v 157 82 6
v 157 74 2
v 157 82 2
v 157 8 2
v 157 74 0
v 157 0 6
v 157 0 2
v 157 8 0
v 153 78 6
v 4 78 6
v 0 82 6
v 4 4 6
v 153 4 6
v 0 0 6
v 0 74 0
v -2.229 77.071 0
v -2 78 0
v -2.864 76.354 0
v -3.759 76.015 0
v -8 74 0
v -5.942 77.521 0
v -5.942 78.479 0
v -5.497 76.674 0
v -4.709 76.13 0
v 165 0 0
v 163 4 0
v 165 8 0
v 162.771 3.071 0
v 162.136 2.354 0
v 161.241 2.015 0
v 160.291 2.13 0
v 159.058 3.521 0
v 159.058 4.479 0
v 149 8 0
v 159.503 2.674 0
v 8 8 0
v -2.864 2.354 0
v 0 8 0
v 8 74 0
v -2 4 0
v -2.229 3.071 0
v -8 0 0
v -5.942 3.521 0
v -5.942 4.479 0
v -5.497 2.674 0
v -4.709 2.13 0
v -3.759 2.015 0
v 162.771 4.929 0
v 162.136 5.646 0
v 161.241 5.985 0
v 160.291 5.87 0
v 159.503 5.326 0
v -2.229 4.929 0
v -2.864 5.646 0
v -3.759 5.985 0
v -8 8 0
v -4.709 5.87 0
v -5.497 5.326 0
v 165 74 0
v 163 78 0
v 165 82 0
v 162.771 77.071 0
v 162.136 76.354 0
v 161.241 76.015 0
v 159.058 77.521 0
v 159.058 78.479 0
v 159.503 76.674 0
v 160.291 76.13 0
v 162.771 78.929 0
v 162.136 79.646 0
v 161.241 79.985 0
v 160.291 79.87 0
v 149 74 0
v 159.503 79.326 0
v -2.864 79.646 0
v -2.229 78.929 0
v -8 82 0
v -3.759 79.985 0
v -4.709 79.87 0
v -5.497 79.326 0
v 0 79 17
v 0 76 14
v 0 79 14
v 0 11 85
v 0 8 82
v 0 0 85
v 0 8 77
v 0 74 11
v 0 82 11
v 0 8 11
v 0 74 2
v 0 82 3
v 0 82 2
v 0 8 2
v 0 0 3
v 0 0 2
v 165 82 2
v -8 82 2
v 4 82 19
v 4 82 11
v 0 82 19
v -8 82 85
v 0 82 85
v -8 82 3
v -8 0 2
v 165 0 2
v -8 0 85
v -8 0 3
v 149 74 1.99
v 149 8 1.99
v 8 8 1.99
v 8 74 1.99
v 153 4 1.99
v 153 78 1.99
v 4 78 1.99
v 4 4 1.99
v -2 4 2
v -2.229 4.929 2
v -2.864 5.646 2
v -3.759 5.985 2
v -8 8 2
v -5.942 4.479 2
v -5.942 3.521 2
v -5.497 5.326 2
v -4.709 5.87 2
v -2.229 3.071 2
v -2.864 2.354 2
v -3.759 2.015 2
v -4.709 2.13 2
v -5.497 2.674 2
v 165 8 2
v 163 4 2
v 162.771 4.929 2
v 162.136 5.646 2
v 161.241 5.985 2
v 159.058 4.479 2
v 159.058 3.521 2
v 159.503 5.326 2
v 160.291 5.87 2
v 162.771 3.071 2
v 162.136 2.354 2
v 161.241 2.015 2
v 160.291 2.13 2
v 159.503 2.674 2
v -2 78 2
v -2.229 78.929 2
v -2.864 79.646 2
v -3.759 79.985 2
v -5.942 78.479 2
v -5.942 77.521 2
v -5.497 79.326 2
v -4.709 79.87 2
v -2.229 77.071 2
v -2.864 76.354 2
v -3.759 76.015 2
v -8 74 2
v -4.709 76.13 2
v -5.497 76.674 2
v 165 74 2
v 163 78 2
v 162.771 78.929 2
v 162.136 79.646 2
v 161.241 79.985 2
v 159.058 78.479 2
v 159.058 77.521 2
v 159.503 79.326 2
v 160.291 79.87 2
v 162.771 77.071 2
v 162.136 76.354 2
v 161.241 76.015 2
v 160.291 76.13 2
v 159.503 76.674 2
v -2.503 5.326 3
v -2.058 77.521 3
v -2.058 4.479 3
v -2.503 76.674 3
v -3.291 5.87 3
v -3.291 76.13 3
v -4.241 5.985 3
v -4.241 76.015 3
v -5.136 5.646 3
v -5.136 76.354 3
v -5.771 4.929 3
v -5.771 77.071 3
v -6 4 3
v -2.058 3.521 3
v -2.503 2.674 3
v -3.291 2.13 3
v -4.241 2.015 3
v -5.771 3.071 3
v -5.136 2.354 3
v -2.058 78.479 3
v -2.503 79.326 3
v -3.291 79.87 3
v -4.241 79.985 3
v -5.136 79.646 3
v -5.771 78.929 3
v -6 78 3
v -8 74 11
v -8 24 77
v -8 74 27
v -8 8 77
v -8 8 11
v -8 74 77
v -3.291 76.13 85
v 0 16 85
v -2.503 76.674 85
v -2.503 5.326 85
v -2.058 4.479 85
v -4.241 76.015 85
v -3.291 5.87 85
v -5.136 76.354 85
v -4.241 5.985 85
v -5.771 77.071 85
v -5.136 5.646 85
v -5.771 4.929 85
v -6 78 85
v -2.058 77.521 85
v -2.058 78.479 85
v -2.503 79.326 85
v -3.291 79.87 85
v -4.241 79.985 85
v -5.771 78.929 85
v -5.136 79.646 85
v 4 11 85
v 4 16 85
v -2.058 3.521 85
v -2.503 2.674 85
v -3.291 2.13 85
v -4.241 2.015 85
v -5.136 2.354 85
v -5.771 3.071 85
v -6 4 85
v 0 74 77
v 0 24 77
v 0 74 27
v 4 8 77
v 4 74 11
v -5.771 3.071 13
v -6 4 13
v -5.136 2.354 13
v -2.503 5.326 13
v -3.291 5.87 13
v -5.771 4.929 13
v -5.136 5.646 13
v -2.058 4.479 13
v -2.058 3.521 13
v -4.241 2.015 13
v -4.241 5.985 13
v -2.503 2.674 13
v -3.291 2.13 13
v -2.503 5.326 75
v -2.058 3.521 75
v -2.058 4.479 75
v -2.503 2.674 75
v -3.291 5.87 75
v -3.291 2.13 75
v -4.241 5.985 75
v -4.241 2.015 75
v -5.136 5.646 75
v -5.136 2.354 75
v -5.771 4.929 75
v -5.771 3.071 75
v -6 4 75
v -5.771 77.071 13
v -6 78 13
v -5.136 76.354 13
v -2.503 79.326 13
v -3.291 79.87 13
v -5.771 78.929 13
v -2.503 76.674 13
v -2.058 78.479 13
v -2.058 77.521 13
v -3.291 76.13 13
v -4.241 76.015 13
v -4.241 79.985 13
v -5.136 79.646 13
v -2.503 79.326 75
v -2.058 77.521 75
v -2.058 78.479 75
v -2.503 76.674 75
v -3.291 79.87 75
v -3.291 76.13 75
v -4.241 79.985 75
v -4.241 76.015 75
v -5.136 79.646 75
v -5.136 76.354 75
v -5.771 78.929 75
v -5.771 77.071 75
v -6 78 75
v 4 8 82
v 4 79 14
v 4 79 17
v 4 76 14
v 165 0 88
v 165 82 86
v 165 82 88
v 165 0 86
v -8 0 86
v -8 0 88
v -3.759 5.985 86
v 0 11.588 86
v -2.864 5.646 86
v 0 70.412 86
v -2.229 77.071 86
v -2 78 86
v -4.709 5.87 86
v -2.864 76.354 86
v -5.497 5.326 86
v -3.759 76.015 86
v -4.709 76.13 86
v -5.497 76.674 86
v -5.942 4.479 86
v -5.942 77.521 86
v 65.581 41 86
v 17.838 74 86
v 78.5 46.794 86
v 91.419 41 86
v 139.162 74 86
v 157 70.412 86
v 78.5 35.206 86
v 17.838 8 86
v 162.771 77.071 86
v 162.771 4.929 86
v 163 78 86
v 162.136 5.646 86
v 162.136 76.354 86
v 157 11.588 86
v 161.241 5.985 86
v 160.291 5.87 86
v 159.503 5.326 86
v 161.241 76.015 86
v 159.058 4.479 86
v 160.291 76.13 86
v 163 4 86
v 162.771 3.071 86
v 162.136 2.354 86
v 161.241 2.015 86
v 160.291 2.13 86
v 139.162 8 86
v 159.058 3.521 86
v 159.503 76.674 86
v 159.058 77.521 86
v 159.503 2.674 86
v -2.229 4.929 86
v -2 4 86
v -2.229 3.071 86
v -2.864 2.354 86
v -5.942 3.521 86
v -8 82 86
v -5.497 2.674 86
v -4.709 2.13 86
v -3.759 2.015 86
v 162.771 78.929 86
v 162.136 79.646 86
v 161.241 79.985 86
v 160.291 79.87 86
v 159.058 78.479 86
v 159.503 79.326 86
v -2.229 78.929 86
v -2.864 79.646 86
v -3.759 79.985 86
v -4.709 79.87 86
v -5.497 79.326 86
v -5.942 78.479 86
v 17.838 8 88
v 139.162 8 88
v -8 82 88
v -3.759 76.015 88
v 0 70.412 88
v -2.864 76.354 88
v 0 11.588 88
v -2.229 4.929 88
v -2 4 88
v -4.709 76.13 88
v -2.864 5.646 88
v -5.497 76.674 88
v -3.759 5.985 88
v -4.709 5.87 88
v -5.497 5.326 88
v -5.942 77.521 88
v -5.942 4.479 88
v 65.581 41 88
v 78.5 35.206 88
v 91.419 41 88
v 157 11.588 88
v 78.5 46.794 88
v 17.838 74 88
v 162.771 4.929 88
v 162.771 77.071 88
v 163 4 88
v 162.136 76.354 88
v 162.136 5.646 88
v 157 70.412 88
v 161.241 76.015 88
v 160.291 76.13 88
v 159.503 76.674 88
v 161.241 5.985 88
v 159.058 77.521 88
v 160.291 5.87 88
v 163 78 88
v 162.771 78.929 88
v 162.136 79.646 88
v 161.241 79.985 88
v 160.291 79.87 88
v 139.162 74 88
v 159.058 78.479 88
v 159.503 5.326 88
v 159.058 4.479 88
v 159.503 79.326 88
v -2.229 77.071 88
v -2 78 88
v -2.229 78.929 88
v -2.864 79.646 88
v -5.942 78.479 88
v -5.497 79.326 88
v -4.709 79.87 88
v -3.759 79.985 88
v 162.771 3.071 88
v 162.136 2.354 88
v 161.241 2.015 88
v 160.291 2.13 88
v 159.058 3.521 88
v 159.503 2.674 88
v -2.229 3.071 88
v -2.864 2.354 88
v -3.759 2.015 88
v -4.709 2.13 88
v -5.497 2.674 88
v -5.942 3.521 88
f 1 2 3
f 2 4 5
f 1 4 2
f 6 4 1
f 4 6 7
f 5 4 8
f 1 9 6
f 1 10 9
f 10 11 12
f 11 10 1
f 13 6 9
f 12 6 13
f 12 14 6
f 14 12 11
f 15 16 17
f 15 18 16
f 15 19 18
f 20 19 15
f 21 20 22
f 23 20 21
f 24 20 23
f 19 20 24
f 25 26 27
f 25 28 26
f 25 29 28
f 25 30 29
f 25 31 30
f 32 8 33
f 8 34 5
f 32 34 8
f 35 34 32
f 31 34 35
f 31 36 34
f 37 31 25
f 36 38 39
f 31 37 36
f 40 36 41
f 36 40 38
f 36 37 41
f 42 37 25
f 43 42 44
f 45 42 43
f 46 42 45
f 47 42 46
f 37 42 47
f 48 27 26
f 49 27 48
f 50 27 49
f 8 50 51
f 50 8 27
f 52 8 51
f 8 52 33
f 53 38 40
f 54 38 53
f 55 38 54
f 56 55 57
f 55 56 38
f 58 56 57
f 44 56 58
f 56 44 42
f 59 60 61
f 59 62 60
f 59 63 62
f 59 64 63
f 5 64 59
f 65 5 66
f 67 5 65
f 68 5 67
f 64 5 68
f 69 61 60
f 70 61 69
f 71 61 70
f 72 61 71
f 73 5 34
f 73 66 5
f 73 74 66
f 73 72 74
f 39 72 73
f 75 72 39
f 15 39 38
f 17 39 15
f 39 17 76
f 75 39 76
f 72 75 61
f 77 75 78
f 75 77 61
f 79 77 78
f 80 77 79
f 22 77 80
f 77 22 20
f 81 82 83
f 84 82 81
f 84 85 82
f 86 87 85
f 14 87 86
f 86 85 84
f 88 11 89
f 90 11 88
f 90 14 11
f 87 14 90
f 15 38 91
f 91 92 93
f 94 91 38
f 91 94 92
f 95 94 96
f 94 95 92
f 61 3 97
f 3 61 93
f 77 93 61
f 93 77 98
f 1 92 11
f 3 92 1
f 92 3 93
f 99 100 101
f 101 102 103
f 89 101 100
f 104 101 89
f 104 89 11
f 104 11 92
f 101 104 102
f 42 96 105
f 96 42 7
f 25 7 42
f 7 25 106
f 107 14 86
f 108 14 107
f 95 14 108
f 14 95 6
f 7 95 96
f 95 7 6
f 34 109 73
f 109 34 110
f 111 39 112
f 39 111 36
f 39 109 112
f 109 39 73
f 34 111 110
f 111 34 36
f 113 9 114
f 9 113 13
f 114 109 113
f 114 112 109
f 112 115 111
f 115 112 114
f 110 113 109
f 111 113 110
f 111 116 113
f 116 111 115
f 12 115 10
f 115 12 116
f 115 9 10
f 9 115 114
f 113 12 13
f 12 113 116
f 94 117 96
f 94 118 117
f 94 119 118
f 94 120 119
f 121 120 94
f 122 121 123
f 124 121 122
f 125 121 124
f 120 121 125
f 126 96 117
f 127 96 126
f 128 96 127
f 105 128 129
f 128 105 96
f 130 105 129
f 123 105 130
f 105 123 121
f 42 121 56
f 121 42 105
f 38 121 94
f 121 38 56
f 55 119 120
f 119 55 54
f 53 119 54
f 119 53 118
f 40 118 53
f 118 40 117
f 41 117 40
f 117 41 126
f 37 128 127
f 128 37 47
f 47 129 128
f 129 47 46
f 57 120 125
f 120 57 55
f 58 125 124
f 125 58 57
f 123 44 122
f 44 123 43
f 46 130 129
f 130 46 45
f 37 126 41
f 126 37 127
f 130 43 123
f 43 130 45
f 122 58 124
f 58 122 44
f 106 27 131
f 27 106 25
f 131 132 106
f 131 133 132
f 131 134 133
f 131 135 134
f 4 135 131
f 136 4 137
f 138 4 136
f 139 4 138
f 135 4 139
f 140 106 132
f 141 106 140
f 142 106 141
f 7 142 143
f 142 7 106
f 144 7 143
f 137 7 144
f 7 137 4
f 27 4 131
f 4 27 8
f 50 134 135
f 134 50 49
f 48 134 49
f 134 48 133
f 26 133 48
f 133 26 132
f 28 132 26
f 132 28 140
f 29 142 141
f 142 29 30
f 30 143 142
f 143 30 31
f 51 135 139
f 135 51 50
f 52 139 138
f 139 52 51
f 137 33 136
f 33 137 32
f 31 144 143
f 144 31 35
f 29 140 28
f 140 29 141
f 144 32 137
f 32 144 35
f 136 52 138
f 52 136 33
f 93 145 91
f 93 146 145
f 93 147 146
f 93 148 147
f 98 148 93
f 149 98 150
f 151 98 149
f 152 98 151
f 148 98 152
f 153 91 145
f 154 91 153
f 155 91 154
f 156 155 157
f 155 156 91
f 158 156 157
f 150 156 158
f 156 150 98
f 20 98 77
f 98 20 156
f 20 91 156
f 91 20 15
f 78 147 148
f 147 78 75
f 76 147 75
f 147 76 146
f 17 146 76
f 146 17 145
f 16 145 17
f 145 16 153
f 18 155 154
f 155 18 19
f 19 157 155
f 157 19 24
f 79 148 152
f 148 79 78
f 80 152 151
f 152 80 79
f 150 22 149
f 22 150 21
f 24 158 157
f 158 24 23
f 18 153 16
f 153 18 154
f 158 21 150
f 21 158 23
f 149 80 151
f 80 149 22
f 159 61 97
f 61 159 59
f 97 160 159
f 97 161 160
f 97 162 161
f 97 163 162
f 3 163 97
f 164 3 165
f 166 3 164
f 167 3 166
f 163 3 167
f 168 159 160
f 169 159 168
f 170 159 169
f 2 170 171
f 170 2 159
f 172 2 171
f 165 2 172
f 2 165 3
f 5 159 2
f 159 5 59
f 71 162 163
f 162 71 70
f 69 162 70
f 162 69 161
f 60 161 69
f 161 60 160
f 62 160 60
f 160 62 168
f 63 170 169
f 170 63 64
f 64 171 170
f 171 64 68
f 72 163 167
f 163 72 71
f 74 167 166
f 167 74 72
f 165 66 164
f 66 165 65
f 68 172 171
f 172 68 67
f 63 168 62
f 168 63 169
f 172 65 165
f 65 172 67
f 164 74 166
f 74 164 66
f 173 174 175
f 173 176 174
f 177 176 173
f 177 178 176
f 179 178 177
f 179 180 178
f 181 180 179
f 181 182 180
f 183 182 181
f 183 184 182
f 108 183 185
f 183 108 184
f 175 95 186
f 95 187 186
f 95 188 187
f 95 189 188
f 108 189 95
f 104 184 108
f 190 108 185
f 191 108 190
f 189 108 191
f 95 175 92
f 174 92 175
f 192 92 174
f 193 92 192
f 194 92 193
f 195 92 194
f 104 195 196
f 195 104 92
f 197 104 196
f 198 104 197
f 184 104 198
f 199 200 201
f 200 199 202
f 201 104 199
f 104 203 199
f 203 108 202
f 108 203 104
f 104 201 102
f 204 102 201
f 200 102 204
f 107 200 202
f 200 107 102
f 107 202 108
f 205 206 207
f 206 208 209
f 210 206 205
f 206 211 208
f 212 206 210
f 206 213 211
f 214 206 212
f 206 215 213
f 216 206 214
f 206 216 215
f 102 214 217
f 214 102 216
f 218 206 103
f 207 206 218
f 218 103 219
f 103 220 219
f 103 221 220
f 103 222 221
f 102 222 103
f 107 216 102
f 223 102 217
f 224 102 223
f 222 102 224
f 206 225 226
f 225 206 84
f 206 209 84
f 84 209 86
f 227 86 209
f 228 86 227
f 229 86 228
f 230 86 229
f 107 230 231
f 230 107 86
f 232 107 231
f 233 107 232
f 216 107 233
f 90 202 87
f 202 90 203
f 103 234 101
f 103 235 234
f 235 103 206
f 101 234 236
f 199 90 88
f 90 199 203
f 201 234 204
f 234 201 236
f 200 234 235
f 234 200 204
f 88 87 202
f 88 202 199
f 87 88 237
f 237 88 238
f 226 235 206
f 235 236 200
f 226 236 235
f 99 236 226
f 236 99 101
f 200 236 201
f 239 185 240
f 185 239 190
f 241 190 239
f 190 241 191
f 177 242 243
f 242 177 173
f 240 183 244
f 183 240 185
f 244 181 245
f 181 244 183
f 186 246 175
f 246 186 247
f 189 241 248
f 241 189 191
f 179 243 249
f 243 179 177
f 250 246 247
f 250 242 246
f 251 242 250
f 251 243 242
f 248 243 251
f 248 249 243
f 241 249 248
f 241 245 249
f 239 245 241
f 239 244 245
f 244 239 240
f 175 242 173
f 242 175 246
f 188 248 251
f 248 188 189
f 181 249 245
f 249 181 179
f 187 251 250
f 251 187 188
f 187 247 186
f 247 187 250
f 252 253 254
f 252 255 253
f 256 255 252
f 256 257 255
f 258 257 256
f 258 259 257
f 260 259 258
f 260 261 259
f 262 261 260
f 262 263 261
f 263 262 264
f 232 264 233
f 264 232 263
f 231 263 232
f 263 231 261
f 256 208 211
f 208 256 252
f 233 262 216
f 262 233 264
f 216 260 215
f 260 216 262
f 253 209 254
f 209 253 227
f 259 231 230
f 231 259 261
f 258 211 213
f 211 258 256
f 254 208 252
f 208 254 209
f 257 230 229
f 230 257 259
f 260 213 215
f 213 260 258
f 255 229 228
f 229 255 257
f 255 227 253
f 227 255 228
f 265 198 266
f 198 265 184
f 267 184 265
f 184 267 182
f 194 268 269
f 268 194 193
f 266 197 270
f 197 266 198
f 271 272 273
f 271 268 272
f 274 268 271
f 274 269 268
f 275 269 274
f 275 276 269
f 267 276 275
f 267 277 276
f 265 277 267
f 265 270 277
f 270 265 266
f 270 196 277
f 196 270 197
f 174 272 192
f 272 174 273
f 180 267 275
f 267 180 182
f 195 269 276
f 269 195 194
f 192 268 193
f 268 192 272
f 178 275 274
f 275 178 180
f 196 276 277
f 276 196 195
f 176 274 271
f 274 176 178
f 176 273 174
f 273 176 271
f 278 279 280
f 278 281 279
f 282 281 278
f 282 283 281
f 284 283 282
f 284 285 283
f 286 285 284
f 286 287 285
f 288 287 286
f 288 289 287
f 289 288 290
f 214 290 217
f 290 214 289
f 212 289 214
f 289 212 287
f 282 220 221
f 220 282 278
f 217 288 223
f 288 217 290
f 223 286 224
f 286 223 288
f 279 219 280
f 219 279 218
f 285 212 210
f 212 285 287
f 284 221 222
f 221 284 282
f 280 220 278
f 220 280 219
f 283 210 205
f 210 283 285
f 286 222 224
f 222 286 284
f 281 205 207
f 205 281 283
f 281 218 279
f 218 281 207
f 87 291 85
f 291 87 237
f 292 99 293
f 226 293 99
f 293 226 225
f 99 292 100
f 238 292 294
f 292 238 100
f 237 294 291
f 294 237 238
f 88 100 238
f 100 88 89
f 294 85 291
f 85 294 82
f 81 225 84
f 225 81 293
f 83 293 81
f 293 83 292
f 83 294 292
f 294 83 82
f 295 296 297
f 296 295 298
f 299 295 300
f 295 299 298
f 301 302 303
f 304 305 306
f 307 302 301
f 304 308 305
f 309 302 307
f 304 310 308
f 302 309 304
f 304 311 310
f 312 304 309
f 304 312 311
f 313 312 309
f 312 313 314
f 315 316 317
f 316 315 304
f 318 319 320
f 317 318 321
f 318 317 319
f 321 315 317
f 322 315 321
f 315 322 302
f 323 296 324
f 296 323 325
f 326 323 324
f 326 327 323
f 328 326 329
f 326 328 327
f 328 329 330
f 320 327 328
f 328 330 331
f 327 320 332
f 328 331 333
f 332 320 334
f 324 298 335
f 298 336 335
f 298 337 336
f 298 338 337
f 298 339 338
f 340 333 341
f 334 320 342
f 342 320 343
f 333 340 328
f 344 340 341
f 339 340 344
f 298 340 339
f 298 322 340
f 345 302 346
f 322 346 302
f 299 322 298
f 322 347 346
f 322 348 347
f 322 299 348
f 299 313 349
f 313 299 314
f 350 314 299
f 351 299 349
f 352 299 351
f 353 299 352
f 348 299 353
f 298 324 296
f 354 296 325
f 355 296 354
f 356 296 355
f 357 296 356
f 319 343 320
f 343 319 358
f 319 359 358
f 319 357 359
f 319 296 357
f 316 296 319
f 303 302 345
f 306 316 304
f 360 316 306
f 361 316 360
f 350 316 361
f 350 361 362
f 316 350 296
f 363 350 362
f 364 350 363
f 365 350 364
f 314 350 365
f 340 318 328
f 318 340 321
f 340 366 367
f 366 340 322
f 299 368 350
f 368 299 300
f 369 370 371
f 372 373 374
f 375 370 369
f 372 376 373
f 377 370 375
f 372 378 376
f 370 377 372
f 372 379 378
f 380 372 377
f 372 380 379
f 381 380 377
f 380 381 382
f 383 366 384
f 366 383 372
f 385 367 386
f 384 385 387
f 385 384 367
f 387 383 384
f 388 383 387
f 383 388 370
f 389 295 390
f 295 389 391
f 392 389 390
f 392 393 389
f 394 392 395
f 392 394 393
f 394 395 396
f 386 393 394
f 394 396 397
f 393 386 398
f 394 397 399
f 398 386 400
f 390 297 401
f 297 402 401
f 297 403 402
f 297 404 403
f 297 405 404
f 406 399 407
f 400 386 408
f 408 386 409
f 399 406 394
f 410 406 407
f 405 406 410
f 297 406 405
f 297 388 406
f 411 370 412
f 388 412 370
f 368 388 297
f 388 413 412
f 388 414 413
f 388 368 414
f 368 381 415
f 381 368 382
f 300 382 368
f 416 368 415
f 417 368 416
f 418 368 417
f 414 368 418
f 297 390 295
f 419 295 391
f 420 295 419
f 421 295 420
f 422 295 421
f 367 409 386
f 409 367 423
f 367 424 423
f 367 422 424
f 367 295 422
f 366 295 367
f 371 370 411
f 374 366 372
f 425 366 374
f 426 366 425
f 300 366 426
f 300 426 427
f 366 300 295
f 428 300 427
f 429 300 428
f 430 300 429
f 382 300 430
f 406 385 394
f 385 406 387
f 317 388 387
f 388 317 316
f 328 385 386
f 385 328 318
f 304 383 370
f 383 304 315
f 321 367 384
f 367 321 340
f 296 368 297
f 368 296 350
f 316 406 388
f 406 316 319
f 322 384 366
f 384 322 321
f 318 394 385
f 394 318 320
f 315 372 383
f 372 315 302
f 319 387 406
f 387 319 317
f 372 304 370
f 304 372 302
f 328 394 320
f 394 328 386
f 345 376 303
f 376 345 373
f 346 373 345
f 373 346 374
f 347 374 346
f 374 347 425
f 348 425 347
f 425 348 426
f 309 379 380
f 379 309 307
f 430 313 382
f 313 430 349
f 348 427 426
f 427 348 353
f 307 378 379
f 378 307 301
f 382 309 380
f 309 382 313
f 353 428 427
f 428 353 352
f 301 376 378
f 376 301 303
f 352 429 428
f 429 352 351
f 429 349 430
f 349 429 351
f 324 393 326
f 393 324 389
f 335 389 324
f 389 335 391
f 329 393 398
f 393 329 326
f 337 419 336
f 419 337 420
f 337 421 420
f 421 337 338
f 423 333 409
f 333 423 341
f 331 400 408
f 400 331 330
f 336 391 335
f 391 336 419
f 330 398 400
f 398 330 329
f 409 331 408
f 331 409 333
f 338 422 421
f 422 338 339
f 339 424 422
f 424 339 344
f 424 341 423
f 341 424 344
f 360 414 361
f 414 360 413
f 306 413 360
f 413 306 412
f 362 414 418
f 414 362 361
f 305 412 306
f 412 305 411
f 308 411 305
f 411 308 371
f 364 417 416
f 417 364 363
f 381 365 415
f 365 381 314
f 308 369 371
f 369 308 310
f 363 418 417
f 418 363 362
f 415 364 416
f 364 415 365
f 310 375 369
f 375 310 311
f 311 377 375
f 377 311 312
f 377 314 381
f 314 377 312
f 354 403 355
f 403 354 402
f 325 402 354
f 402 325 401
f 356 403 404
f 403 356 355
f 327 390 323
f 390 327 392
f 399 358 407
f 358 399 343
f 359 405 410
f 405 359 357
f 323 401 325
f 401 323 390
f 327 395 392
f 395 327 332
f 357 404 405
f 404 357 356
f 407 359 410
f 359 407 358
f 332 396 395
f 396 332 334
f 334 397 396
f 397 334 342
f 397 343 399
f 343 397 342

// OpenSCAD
part="NOSTL_all";//[NOSTL_all,phone_frame,mirror_frame,mirror_frame_mirrored,top_bracket,filter_holder]
width=149;
height=74;
shelf=4;
depth=4;
wall_v=4;
wall_h=2;
hole=4;
glass=3;
bissl=1/100;
beam=2*wall_h+hole;
filter_size=[50,50];
filter_placement=[32,41];
fp=[filter_placement[0],filter_placement[1],wall_h/2];
$fs=1/1;
$fa=1/1;
screws=[[-beam/2,beam/2,wall_h/2],
          [width+2*wall_v+beam/2,beam/2,wall_h/2],
          [-beam/2,height+2*wall_v-beam/2,wall_h/2],
          [width+2*wall_v+beam/2,height+2*wall_v-beam/2,wall_h/2]];

module chain_hull() {
  for (i = [0:$children-2]) {
    hull() {
      children(i);
      children(i+1);
    }
  }
}

module pairwise_hull() {
  for (i=[0:$children-1]) for (j=[0:i]) hull() {
    children(i);
    children(j);
  }
}

module phone_frame() {
  difference() {
    cube([width+2*wall_v,height+2*wall_v,wall_h+depth]);
    translate([wall_v+shelf,wall_v+shelf,-bissl])cube([width-2*shelf,height-2*shelf,wall_h+2*bissl]);
    translate([wall_v,wall_v,wall_h-bissl])cube([width,height,depth+2*bissl]);
  }
  for(tr=screws) translate(tr) difference() {
    cube([beam,beam,wall_h],center=true);
    cylinder(d=hole,h=wall_h+bissl,center=true);
  }
}

module mirror_frame() {
  difference() {
    chain_hull() {
      translate([height+2*wall_v-beam,0,0]) cube(beam);
      translate([0,0,0]) cube(beam);
      translate([0,height+2*wall_v-beam,0]) cube(beam);
      translate([height+2*wall_v-beam,height+2*wall_v-beam,0]) cube(beam);
      translate([height+2*wall_v-beam,beam,0]) cube(beam);
      translate([beam,height+2*wall_v-beam,0]) cube(beam);
    }
    translate([0,beam/2,beam/2]) rotate([0,90,0]) cylinder(d=hole,h=20,center=true);
    translate([height+2*wall_v,beam/2,beam/2]) rotate([0,90,0]) cylinder(d=hole,h=20,center=true);
    translate([0,height+2*wall_v-beam/2,beam/2]) rotate([0,90,0]) cylinder(d=hole,h=20,center=true);
    translate([height+2*wall_v,height+2*wall_v-beam/2,beam/2]) rotate([0,90,0]) cylinder(d=hole,h=20,center=true);
  }
  difference() {
    hull() {
      translate([beam,beam+height+2*wall_v-2*beam,beam]) cube([beam,beam,wall_v]);
      translate([beam+height+2*wall_v-2*beam,beam,beam]) cube([beam,beam,wall_v]);
    }
    hull() {
      translate([beam+glass,beam+height+2*wall_v-2*glass-beam,beam]) cube([glass,glass,beam+bissl]);
      translate([beam+height+2*wall_v-glass,0,beam]) cube([glass,glass,beam+bissl]);
    }
  }
}

module top_bracket() {
  difference() {
    chain_hull() {
      translate(screws[0]) cube([beam,beam,wall_h],center=true);
      translate(screws[1]) cube([beam,beam,wall_h],center=true);
      translate(screws[2]) cube([beam,beam,wall_h],center=true);
      translate(screws[3]) cube([beam,beam,wall_h],center=true);
      translate(screws[0]) cube([beam,beam,wall_h],center=true);
      translate(screws[2]) cube([beam,beam,wall_h],center=true);
      translate(screws[1]) cube([beam,beam,wall_h],center=true);
      translate(screws[3]) cube([beam,beam,wall_h],center=true);
    }
    for (tr=screws) translate(tr) cylinder(d=hole,h=wall_h+bissl,center=true);
  }
}

module filter_holder() {
  difference() {
    union() {
      chain_hull() {
        translate(screws[0]) cube([beam,beam,2*wall_h],center=true);
        translate(fp) cube([beam,beam,2*wall_h],center=true);
        translate(screws[0]) cube([beam,beam,2*wall_h],center=true);
        translate(screws[1]) cube([beam,beam,2*wall_h],center=true);
        translate(fp) cube([beam,beam,2*wall_h],center=true);
        translate(screws[1]) cube([beam,beam,2*wall_h],center=true);
        translate(screws[3]) cube([beam,beam,2*wall_h],center=true);
        translate(fp) cube([beam,beam,2*wall_h],center=true);
        translate(screws[3]) cube([beam,beam,2*wall_h],center=true);
        translate(screws[2]) cube([beam,beam,2*wall_h],center=true);
        translate(fp) cube([beam,beam,2*wall_h],center=true);
        translate(screws[2]) cube([beam,beam,2*wall_h],center=true);
        translate(screws[0]) cube([beam,beam,2*wall_h],center=true);
      }
      translate(fp) cube([filter_size[0]+2*wall_v,filter_size[1]+2*wall_v,2*wall_h],center=true);
    }
    translate(fp) cube([filter_size[0]-2*shelf,filter_size[1]-2*shelf,3*wall_h],center=true);
    translate([0,0,wall_h])translate(fp) cube([filter_size[0],filter_size[1],2*wall_h],center=true);
    for (tr=screws) translate(tr) cylinder(d=hole,h=2*wall_h+bissl,center=true);

  }
}

if (part=="phone_frame") phone_frame();
if (part=="mirror_frame") mirror_frame();
if (part=="mirror_frame_mirrored") mirror([1,0,0])mirror_frame();
if (part=="top_bracket") top_bracket();
if (part=="filter_holder") filter_holder();
if (part=="NOSTL_all") {
  phone_frame();
  translate([-beam,0,wall_h+1]) mirror([1,0,0]) rotate([0,-90,0]) mirror_frame();
  translate([0,0,height+2*wall_v+wall_h+2])top_bracket();
  }
